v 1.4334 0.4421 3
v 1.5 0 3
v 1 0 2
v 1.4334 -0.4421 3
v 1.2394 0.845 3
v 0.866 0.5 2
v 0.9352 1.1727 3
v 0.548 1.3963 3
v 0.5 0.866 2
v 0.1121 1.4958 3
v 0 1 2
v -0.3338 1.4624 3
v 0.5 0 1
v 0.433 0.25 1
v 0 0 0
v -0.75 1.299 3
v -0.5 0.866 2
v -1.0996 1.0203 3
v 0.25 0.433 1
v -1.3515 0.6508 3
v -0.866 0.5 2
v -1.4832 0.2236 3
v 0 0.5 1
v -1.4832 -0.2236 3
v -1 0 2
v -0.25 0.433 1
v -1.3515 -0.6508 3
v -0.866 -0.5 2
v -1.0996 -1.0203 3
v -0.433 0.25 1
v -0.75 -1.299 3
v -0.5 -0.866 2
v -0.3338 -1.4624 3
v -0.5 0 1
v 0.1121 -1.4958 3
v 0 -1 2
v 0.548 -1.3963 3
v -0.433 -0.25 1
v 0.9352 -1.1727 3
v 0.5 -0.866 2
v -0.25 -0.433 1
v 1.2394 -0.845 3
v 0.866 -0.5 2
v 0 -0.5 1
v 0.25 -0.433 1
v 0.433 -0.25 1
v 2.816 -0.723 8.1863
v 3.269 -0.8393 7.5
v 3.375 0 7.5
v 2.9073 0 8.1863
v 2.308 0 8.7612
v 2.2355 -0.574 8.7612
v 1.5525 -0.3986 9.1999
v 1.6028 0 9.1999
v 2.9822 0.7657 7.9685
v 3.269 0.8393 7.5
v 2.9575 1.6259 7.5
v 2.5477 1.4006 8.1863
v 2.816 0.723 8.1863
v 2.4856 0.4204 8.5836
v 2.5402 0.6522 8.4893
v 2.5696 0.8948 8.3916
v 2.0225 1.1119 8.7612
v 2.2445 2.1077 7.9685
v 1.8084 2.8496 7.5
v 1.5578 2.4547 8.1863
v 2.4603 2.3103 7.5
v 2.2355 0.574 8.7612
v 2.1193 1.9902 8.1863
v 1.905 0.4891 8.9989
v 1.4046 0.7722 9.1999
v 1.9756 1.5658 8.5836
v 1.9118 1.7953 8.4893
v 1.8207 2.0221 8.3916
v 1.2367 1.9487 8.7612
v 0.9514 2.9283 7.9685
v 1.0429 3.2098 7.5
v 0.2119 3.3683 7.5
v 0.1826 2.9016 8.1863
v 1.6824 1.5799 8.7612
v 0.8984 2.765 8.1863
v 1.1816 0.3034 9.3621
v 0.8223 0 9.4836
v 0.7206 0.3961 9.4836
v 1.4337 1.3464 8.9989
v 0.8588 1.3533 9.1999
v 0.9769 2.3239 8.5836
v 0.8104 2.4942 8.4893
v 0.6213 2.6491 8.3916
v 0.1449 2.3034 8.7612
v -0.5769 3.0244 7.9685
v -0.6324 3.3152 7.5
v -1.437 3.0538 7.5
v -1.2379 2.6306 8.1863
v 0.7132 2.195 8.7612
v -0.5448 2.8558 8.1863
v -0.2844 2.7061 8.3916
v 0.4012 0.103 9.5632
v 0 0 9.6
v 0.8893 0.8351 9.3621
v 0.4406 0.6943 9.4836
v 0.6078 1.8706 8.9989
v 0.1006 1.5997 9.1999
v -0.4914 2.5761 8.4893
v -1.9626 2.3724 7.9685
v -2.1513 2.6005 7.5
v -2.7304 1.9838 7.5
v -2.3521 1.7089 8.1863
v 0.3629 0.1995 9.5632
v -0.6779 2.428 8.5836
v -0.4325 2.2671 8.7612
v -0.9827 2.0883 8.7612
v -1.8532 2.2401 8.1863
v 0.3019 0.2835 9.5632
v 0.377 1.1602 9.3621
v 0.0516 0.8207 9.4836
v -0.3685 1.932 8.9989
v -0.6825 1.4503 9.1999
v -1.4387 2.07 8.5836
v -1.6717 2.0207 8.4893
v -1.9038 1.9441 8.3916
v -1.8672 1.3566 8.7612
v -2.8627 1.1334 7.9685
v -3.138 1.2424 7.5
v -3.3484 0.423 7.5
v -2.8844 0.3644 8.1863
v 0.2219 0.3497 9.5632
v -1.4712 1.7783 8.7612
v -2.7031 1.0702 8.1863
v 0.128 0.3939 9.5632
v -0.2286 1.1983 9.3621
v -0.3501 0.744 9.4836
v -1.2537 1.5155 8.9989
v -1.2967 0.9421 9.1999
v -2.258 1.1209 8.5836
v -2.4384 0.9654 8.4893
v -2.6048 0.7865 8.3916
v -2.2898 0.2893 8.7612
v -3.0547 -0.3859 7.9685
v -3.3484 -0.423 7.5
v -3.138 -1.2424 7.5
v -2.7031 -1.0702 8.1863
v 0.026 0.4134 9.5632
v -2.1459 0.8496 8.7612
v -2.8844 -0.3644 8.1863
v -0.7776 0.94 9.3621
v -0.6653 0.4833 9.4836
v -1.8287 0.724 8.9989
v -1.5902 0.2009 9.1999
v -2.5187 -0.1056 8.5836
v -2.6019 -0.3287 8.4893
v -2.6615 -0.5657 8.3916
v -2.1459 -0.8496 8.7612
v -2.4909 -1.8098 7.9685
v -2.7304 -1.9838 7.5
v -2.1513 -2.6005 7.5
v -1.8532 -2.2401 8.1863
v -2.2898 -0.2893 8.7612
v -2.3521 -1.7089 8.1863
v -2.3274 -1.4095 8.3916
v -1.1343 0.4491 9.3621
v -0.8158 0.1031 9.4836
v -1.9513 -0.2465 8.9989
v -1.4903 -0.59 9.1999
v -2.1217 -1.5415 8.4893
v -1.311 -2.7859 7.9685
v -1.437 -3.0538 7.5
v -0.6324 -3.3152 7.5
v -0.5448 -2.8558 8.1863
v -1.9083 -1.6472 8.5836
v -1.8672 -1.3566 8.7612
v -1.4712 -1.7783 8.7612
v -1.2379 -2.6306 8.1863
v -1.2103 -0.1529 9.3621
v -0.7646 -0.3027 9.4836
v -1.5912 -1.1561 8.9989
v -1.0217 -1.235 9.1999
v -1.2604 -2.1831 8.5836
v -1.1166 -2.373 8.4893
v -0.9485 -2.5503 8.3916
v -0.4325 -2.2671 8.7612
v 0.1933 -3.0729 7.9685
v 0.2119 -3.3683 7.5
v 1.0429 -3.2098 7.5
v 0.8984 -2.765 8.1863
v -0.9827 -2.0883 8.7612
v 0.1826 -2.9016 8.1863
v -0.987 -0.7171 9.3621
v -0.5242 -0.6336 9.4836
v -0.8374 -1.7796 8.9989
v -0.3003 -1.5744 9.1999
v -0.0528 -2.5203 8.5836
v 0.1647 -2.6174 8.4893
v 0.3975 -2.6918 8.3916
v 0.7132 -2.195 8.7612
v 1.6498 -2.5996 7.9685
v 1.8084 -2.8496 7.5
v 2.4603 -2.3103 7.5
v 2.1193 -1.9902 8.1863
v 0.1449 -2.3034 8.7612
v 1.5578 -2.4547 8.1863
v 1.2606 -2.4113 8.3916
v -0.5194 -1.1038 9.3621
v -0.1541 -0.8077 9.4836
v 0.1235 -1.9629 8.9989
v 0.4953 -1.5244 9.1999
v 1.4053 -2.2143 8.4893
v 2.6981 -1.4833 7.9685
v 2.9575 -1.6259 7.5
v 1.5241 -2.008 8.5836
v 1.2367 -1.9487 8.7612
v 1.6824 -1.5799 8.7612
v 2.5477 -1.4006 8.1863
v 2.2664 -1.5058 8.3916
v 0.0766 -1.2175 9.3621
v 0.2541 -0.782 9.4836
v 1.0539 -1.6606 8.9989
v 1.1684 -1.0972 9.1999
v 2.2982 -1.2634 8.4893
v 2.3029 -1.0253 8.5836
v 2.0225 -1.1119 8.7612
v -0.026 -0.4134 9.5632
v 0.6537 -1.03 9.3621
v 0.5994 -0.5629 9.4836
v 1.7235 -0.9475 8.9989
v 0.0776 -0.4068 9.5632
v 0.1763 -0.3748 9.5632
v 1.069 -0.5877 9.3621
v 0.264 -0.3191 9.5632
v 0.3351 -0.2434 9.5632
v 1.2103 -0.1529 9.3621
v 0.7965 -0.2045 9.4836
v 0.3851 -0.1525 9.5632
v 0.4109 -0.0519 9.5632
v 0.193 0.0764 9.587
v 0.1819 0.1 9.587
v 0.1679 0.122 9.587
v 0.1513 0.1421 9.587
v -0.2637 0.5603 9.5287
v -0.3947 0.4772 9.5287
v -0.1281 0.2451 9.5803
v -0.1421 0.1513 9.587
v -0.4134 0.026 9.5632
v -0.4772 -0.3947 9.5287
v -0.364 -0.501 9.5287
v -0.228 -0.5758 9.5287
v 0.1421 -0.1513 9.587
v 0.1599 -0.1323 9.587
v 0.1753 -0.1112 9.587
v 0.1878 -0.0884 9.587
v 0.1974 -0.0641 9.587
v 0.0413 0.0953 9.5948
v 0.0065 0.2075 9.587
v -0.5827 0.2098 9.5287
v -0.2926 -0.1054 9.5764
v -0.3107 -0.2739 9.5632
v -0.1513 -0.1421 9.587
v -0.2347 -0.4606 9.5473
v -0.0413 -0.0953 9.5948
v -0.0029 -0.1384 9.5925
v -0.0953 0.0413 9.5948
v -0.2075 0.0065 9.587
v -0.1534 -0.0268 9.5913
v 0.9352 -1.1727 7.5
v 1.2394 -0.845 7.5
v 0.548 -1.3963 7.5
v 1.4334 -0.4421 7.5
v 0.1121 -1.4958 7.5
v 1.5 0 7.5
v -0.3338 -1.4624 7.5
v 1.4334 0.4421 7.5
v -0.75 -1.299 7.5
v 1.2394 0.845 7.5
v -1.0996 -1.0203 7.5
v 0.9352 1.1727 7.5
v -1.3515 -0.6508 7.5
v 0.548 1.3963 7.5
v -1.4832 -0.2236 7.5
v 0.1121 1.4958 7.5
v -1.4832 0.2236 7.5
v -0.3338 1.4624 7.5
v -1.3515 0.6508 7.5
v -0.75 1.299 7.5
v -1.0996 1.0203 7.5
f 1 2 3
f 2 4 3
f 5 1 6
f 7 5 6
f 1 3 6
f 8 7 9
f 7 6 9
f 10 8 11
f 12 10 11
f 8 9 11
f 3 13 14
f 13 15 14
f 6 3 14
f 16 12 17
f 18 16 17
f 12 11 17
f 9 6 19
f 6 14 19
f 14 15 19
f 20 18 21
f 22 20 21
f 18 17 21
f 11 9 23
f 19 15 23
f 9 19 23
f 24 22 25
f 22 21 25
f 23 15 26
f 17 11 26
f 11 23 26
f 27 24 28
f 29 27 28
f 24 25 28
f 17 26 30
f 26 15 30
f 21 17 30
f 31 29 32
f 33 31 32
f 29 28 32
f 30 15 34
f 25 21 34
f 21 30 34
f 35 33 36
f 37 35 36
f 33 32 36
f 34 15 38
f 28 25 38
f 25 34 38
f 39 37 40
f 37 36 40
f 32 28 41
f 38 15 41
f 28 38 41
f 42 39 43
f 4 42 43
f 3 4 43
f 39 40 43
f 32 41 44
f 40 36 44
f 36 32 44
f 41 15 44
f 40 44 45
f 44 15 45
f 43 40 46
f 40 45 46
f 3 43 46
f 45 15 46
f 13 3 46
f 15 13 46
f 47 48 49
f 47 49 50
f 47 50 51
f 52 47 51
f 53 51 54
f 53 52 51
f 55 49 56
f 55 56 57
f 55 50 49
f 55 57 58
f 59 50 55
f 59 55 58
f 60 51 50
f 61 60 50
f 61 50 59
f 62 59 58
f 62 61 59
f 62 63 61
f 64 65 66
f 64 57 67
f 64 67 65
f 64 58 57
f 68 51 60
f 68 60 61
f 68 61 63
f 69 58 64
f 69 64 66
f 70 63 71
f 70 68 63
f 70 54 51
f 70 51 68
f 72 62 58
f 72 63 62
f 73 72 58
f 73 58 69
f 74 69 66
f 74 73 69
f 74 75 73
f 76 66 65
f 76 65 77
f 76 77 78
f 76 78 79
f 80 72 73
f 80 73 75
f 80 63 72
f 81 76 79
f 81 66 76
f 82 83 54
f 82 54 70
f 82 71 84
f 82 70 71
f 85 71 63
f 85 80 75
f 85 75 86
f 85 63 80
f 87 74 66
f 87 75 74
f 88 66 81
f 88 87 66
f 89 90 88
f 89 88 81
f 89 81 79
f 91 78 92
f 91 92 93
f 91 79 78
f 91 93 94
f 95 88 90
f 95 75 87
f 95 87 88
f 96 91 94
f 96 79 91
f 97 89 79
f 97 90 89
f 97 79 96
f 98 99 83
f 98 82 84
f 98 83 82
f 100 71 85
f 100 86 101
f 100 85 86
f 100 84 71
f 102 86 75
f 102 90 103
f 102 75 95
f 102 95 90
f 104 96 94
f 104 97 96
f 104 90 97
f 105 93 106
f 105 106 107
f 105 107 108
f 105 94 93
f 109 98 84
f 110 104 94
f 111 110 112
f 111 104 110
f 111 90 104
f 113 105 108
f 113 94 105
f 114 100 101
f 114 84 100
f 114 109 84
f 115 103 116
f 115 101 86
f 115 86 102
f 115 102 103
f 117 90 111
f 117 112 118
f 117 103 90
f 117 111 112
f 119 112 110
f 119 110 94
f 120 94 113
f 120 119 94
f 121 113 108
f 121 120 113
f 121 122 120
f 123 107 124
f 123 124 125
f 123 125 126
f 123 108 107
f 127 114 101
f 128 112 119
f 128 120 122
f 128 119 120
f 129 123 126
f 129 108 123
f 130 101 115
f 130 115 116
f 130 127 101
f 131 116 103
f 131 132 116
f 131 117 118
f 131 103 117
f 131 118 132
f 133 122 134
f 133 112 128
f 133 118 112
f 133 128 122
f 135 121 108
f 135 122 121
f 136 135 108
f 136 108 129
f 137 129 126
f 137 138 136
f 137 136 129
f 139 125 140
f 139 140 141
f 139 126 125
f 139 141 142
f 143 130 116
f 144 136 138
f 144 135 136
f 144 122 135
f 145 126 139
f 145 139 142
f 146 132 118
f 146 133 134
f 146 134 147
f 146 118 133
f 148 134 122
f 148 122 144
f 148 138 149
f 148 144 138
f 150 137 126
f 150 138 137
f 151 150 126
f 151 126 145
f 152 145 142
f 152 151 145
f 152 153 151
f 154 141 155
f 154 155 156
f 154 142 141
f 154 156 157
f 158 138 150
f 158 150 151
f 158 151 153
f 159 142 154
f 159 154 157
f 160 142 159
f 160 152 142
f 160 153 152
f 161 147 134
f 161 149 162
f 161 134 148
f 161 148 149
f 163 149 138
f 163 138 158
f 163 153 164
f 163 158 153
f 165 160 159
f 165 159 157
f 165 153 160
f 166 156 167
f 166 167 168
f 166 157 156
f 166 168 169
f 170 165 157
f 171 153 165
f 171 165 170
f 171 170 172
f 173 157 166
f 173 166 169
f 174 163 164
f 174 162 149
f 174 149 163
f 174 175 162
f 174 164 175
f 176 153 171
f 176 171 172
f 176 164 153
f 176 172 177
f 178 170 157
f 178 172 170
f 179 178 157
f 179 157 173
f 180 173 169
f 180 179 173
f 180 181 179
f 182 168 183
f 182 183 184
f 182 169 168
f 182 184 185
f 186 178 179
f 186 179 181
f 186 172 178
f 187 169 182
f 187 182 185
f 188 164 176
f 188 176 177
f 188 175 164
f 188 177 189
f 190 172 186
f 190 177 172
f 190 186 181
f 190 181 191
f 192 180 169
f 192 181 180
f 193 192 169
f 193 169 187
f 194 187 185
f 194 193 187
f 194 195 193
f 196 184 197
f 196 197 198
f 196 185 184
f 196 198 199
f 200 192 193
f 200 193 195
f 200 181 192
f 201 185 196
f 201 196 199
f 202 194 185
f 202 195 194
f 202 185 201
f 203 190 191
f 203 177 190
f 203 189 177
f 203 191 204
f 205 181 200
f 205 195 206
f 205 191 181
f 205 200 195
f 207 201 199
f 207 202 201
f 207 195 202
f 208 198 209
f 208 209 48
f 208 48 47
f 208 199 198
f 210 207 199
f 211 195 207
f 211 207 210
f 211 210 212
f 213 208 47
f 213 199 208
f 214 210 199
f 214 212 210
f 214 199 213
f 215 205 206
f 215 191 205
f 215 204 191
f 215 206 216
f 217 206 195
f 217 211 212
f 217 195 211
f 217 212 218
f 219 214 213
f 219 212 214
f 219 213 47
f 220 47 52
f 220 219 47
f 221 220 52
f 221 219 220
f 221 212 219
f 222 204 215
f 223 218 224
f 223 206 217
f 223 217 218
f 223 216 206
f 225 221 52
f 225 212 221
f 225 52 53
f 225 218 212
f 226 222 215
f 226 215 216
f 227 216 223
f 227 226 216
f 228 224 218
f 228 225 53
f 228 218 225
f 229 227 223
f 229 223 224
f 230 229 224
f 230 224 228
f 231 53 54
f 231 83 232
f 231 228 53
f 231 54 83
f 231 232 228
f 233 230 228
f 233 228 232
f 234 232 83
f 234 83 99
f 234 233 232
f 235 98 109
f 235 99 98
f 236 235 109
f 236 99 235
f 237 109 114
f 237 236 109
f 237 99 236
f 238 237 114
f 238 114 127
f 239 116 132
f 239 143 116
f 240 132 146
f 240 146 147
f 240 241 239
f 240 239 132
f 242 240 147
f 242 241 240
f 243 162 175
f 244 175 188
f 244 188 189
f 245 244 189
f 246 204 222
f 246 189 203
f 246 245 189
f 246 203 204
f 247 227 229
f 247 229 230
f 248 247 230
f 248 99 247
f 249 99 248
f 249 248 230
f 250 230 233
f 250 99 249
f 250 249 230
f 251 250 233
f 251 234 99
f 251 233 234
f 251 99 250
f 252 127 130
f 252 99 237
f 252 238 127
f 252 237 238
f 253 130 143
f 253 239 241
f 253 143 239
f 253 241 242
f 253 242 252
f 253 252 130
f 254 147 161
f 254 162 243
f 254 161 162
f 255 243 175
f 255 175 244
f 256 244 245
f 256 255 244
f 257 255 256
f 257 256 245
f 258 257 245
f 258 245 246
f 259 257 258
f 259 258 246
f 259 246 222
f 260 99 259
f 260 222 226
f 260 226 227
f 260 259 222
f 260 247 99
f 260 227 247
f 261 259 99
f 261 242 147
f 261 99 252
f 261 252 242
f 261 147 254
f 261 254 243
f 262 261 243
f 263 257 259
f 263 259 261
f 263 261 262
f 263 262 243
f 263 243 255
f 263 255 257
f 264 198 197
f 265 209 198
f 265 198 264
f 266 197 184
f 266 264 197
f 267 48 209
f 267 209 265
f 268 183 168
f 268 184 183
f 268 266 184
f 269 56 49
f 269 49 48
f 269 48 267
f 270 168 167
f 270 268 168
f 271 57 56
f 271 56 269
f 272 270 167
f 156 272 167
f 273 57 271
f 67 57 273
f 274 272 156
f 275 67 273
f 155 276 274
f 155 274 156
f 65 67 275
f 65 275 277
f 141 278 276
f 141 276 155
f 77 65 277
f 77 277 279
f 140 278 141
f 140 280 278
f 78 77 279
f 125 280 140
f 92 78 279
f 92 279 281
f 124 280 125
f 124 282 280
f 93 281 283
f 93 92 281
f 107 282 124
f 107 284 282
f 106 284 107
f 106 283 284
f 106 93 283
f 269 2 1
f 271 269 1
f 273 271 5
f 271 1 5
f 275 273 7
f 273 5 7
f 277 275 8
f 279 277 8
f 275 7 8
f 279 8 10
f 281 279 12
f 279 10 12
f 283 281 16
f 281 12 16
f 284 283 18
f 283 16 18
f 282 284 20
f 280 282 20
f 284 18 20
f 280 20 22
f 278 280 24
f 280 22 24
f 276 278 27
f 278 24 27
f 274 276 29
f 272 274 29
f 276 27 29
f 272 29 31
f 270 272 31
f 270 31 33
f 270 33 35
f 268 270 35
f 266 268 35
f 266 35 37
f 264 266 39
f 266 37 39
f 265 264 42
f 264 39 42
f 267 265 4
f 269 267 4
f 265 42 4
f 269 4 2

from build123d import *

# Parameters (mm, degrees)
F0_R     = 1.5
F1_DEPTH = 7.5
F4_SIZE2 = 1.5
F4_SIZE  = 3


with BuildPart() as f1:
    # F0 (on Top) → F1 (new body)
    with BuildSketch(Plane.XY):
        Circle(F0_R)
    extrude(amount=F1_DEPTH)

    # F2 (on Front) → F3 (revolve)
    with BuildSketch(Plane.XZ):
        with BuildLine():
            Line((0, 9.6), (0, 7.5))
            Line((0, 7.5), (3.375, 7.5))
            ThreePointArc((3.375, 7.5), (1.966819, 8.998906), (0, 9.6))
        make_face()
    revolve(axis=Axis((0, 0, 8.55), (0, 0, 1)))

    # F4
    f4_edges = [f1.edges().sort_by_distance(p)[0] for p in [
        (-1.5, 0, 0),
    ]]
    chamfer(f4_edges, length=F4_SIZE, length2=F4_SIZE2)


solid = f1.part
